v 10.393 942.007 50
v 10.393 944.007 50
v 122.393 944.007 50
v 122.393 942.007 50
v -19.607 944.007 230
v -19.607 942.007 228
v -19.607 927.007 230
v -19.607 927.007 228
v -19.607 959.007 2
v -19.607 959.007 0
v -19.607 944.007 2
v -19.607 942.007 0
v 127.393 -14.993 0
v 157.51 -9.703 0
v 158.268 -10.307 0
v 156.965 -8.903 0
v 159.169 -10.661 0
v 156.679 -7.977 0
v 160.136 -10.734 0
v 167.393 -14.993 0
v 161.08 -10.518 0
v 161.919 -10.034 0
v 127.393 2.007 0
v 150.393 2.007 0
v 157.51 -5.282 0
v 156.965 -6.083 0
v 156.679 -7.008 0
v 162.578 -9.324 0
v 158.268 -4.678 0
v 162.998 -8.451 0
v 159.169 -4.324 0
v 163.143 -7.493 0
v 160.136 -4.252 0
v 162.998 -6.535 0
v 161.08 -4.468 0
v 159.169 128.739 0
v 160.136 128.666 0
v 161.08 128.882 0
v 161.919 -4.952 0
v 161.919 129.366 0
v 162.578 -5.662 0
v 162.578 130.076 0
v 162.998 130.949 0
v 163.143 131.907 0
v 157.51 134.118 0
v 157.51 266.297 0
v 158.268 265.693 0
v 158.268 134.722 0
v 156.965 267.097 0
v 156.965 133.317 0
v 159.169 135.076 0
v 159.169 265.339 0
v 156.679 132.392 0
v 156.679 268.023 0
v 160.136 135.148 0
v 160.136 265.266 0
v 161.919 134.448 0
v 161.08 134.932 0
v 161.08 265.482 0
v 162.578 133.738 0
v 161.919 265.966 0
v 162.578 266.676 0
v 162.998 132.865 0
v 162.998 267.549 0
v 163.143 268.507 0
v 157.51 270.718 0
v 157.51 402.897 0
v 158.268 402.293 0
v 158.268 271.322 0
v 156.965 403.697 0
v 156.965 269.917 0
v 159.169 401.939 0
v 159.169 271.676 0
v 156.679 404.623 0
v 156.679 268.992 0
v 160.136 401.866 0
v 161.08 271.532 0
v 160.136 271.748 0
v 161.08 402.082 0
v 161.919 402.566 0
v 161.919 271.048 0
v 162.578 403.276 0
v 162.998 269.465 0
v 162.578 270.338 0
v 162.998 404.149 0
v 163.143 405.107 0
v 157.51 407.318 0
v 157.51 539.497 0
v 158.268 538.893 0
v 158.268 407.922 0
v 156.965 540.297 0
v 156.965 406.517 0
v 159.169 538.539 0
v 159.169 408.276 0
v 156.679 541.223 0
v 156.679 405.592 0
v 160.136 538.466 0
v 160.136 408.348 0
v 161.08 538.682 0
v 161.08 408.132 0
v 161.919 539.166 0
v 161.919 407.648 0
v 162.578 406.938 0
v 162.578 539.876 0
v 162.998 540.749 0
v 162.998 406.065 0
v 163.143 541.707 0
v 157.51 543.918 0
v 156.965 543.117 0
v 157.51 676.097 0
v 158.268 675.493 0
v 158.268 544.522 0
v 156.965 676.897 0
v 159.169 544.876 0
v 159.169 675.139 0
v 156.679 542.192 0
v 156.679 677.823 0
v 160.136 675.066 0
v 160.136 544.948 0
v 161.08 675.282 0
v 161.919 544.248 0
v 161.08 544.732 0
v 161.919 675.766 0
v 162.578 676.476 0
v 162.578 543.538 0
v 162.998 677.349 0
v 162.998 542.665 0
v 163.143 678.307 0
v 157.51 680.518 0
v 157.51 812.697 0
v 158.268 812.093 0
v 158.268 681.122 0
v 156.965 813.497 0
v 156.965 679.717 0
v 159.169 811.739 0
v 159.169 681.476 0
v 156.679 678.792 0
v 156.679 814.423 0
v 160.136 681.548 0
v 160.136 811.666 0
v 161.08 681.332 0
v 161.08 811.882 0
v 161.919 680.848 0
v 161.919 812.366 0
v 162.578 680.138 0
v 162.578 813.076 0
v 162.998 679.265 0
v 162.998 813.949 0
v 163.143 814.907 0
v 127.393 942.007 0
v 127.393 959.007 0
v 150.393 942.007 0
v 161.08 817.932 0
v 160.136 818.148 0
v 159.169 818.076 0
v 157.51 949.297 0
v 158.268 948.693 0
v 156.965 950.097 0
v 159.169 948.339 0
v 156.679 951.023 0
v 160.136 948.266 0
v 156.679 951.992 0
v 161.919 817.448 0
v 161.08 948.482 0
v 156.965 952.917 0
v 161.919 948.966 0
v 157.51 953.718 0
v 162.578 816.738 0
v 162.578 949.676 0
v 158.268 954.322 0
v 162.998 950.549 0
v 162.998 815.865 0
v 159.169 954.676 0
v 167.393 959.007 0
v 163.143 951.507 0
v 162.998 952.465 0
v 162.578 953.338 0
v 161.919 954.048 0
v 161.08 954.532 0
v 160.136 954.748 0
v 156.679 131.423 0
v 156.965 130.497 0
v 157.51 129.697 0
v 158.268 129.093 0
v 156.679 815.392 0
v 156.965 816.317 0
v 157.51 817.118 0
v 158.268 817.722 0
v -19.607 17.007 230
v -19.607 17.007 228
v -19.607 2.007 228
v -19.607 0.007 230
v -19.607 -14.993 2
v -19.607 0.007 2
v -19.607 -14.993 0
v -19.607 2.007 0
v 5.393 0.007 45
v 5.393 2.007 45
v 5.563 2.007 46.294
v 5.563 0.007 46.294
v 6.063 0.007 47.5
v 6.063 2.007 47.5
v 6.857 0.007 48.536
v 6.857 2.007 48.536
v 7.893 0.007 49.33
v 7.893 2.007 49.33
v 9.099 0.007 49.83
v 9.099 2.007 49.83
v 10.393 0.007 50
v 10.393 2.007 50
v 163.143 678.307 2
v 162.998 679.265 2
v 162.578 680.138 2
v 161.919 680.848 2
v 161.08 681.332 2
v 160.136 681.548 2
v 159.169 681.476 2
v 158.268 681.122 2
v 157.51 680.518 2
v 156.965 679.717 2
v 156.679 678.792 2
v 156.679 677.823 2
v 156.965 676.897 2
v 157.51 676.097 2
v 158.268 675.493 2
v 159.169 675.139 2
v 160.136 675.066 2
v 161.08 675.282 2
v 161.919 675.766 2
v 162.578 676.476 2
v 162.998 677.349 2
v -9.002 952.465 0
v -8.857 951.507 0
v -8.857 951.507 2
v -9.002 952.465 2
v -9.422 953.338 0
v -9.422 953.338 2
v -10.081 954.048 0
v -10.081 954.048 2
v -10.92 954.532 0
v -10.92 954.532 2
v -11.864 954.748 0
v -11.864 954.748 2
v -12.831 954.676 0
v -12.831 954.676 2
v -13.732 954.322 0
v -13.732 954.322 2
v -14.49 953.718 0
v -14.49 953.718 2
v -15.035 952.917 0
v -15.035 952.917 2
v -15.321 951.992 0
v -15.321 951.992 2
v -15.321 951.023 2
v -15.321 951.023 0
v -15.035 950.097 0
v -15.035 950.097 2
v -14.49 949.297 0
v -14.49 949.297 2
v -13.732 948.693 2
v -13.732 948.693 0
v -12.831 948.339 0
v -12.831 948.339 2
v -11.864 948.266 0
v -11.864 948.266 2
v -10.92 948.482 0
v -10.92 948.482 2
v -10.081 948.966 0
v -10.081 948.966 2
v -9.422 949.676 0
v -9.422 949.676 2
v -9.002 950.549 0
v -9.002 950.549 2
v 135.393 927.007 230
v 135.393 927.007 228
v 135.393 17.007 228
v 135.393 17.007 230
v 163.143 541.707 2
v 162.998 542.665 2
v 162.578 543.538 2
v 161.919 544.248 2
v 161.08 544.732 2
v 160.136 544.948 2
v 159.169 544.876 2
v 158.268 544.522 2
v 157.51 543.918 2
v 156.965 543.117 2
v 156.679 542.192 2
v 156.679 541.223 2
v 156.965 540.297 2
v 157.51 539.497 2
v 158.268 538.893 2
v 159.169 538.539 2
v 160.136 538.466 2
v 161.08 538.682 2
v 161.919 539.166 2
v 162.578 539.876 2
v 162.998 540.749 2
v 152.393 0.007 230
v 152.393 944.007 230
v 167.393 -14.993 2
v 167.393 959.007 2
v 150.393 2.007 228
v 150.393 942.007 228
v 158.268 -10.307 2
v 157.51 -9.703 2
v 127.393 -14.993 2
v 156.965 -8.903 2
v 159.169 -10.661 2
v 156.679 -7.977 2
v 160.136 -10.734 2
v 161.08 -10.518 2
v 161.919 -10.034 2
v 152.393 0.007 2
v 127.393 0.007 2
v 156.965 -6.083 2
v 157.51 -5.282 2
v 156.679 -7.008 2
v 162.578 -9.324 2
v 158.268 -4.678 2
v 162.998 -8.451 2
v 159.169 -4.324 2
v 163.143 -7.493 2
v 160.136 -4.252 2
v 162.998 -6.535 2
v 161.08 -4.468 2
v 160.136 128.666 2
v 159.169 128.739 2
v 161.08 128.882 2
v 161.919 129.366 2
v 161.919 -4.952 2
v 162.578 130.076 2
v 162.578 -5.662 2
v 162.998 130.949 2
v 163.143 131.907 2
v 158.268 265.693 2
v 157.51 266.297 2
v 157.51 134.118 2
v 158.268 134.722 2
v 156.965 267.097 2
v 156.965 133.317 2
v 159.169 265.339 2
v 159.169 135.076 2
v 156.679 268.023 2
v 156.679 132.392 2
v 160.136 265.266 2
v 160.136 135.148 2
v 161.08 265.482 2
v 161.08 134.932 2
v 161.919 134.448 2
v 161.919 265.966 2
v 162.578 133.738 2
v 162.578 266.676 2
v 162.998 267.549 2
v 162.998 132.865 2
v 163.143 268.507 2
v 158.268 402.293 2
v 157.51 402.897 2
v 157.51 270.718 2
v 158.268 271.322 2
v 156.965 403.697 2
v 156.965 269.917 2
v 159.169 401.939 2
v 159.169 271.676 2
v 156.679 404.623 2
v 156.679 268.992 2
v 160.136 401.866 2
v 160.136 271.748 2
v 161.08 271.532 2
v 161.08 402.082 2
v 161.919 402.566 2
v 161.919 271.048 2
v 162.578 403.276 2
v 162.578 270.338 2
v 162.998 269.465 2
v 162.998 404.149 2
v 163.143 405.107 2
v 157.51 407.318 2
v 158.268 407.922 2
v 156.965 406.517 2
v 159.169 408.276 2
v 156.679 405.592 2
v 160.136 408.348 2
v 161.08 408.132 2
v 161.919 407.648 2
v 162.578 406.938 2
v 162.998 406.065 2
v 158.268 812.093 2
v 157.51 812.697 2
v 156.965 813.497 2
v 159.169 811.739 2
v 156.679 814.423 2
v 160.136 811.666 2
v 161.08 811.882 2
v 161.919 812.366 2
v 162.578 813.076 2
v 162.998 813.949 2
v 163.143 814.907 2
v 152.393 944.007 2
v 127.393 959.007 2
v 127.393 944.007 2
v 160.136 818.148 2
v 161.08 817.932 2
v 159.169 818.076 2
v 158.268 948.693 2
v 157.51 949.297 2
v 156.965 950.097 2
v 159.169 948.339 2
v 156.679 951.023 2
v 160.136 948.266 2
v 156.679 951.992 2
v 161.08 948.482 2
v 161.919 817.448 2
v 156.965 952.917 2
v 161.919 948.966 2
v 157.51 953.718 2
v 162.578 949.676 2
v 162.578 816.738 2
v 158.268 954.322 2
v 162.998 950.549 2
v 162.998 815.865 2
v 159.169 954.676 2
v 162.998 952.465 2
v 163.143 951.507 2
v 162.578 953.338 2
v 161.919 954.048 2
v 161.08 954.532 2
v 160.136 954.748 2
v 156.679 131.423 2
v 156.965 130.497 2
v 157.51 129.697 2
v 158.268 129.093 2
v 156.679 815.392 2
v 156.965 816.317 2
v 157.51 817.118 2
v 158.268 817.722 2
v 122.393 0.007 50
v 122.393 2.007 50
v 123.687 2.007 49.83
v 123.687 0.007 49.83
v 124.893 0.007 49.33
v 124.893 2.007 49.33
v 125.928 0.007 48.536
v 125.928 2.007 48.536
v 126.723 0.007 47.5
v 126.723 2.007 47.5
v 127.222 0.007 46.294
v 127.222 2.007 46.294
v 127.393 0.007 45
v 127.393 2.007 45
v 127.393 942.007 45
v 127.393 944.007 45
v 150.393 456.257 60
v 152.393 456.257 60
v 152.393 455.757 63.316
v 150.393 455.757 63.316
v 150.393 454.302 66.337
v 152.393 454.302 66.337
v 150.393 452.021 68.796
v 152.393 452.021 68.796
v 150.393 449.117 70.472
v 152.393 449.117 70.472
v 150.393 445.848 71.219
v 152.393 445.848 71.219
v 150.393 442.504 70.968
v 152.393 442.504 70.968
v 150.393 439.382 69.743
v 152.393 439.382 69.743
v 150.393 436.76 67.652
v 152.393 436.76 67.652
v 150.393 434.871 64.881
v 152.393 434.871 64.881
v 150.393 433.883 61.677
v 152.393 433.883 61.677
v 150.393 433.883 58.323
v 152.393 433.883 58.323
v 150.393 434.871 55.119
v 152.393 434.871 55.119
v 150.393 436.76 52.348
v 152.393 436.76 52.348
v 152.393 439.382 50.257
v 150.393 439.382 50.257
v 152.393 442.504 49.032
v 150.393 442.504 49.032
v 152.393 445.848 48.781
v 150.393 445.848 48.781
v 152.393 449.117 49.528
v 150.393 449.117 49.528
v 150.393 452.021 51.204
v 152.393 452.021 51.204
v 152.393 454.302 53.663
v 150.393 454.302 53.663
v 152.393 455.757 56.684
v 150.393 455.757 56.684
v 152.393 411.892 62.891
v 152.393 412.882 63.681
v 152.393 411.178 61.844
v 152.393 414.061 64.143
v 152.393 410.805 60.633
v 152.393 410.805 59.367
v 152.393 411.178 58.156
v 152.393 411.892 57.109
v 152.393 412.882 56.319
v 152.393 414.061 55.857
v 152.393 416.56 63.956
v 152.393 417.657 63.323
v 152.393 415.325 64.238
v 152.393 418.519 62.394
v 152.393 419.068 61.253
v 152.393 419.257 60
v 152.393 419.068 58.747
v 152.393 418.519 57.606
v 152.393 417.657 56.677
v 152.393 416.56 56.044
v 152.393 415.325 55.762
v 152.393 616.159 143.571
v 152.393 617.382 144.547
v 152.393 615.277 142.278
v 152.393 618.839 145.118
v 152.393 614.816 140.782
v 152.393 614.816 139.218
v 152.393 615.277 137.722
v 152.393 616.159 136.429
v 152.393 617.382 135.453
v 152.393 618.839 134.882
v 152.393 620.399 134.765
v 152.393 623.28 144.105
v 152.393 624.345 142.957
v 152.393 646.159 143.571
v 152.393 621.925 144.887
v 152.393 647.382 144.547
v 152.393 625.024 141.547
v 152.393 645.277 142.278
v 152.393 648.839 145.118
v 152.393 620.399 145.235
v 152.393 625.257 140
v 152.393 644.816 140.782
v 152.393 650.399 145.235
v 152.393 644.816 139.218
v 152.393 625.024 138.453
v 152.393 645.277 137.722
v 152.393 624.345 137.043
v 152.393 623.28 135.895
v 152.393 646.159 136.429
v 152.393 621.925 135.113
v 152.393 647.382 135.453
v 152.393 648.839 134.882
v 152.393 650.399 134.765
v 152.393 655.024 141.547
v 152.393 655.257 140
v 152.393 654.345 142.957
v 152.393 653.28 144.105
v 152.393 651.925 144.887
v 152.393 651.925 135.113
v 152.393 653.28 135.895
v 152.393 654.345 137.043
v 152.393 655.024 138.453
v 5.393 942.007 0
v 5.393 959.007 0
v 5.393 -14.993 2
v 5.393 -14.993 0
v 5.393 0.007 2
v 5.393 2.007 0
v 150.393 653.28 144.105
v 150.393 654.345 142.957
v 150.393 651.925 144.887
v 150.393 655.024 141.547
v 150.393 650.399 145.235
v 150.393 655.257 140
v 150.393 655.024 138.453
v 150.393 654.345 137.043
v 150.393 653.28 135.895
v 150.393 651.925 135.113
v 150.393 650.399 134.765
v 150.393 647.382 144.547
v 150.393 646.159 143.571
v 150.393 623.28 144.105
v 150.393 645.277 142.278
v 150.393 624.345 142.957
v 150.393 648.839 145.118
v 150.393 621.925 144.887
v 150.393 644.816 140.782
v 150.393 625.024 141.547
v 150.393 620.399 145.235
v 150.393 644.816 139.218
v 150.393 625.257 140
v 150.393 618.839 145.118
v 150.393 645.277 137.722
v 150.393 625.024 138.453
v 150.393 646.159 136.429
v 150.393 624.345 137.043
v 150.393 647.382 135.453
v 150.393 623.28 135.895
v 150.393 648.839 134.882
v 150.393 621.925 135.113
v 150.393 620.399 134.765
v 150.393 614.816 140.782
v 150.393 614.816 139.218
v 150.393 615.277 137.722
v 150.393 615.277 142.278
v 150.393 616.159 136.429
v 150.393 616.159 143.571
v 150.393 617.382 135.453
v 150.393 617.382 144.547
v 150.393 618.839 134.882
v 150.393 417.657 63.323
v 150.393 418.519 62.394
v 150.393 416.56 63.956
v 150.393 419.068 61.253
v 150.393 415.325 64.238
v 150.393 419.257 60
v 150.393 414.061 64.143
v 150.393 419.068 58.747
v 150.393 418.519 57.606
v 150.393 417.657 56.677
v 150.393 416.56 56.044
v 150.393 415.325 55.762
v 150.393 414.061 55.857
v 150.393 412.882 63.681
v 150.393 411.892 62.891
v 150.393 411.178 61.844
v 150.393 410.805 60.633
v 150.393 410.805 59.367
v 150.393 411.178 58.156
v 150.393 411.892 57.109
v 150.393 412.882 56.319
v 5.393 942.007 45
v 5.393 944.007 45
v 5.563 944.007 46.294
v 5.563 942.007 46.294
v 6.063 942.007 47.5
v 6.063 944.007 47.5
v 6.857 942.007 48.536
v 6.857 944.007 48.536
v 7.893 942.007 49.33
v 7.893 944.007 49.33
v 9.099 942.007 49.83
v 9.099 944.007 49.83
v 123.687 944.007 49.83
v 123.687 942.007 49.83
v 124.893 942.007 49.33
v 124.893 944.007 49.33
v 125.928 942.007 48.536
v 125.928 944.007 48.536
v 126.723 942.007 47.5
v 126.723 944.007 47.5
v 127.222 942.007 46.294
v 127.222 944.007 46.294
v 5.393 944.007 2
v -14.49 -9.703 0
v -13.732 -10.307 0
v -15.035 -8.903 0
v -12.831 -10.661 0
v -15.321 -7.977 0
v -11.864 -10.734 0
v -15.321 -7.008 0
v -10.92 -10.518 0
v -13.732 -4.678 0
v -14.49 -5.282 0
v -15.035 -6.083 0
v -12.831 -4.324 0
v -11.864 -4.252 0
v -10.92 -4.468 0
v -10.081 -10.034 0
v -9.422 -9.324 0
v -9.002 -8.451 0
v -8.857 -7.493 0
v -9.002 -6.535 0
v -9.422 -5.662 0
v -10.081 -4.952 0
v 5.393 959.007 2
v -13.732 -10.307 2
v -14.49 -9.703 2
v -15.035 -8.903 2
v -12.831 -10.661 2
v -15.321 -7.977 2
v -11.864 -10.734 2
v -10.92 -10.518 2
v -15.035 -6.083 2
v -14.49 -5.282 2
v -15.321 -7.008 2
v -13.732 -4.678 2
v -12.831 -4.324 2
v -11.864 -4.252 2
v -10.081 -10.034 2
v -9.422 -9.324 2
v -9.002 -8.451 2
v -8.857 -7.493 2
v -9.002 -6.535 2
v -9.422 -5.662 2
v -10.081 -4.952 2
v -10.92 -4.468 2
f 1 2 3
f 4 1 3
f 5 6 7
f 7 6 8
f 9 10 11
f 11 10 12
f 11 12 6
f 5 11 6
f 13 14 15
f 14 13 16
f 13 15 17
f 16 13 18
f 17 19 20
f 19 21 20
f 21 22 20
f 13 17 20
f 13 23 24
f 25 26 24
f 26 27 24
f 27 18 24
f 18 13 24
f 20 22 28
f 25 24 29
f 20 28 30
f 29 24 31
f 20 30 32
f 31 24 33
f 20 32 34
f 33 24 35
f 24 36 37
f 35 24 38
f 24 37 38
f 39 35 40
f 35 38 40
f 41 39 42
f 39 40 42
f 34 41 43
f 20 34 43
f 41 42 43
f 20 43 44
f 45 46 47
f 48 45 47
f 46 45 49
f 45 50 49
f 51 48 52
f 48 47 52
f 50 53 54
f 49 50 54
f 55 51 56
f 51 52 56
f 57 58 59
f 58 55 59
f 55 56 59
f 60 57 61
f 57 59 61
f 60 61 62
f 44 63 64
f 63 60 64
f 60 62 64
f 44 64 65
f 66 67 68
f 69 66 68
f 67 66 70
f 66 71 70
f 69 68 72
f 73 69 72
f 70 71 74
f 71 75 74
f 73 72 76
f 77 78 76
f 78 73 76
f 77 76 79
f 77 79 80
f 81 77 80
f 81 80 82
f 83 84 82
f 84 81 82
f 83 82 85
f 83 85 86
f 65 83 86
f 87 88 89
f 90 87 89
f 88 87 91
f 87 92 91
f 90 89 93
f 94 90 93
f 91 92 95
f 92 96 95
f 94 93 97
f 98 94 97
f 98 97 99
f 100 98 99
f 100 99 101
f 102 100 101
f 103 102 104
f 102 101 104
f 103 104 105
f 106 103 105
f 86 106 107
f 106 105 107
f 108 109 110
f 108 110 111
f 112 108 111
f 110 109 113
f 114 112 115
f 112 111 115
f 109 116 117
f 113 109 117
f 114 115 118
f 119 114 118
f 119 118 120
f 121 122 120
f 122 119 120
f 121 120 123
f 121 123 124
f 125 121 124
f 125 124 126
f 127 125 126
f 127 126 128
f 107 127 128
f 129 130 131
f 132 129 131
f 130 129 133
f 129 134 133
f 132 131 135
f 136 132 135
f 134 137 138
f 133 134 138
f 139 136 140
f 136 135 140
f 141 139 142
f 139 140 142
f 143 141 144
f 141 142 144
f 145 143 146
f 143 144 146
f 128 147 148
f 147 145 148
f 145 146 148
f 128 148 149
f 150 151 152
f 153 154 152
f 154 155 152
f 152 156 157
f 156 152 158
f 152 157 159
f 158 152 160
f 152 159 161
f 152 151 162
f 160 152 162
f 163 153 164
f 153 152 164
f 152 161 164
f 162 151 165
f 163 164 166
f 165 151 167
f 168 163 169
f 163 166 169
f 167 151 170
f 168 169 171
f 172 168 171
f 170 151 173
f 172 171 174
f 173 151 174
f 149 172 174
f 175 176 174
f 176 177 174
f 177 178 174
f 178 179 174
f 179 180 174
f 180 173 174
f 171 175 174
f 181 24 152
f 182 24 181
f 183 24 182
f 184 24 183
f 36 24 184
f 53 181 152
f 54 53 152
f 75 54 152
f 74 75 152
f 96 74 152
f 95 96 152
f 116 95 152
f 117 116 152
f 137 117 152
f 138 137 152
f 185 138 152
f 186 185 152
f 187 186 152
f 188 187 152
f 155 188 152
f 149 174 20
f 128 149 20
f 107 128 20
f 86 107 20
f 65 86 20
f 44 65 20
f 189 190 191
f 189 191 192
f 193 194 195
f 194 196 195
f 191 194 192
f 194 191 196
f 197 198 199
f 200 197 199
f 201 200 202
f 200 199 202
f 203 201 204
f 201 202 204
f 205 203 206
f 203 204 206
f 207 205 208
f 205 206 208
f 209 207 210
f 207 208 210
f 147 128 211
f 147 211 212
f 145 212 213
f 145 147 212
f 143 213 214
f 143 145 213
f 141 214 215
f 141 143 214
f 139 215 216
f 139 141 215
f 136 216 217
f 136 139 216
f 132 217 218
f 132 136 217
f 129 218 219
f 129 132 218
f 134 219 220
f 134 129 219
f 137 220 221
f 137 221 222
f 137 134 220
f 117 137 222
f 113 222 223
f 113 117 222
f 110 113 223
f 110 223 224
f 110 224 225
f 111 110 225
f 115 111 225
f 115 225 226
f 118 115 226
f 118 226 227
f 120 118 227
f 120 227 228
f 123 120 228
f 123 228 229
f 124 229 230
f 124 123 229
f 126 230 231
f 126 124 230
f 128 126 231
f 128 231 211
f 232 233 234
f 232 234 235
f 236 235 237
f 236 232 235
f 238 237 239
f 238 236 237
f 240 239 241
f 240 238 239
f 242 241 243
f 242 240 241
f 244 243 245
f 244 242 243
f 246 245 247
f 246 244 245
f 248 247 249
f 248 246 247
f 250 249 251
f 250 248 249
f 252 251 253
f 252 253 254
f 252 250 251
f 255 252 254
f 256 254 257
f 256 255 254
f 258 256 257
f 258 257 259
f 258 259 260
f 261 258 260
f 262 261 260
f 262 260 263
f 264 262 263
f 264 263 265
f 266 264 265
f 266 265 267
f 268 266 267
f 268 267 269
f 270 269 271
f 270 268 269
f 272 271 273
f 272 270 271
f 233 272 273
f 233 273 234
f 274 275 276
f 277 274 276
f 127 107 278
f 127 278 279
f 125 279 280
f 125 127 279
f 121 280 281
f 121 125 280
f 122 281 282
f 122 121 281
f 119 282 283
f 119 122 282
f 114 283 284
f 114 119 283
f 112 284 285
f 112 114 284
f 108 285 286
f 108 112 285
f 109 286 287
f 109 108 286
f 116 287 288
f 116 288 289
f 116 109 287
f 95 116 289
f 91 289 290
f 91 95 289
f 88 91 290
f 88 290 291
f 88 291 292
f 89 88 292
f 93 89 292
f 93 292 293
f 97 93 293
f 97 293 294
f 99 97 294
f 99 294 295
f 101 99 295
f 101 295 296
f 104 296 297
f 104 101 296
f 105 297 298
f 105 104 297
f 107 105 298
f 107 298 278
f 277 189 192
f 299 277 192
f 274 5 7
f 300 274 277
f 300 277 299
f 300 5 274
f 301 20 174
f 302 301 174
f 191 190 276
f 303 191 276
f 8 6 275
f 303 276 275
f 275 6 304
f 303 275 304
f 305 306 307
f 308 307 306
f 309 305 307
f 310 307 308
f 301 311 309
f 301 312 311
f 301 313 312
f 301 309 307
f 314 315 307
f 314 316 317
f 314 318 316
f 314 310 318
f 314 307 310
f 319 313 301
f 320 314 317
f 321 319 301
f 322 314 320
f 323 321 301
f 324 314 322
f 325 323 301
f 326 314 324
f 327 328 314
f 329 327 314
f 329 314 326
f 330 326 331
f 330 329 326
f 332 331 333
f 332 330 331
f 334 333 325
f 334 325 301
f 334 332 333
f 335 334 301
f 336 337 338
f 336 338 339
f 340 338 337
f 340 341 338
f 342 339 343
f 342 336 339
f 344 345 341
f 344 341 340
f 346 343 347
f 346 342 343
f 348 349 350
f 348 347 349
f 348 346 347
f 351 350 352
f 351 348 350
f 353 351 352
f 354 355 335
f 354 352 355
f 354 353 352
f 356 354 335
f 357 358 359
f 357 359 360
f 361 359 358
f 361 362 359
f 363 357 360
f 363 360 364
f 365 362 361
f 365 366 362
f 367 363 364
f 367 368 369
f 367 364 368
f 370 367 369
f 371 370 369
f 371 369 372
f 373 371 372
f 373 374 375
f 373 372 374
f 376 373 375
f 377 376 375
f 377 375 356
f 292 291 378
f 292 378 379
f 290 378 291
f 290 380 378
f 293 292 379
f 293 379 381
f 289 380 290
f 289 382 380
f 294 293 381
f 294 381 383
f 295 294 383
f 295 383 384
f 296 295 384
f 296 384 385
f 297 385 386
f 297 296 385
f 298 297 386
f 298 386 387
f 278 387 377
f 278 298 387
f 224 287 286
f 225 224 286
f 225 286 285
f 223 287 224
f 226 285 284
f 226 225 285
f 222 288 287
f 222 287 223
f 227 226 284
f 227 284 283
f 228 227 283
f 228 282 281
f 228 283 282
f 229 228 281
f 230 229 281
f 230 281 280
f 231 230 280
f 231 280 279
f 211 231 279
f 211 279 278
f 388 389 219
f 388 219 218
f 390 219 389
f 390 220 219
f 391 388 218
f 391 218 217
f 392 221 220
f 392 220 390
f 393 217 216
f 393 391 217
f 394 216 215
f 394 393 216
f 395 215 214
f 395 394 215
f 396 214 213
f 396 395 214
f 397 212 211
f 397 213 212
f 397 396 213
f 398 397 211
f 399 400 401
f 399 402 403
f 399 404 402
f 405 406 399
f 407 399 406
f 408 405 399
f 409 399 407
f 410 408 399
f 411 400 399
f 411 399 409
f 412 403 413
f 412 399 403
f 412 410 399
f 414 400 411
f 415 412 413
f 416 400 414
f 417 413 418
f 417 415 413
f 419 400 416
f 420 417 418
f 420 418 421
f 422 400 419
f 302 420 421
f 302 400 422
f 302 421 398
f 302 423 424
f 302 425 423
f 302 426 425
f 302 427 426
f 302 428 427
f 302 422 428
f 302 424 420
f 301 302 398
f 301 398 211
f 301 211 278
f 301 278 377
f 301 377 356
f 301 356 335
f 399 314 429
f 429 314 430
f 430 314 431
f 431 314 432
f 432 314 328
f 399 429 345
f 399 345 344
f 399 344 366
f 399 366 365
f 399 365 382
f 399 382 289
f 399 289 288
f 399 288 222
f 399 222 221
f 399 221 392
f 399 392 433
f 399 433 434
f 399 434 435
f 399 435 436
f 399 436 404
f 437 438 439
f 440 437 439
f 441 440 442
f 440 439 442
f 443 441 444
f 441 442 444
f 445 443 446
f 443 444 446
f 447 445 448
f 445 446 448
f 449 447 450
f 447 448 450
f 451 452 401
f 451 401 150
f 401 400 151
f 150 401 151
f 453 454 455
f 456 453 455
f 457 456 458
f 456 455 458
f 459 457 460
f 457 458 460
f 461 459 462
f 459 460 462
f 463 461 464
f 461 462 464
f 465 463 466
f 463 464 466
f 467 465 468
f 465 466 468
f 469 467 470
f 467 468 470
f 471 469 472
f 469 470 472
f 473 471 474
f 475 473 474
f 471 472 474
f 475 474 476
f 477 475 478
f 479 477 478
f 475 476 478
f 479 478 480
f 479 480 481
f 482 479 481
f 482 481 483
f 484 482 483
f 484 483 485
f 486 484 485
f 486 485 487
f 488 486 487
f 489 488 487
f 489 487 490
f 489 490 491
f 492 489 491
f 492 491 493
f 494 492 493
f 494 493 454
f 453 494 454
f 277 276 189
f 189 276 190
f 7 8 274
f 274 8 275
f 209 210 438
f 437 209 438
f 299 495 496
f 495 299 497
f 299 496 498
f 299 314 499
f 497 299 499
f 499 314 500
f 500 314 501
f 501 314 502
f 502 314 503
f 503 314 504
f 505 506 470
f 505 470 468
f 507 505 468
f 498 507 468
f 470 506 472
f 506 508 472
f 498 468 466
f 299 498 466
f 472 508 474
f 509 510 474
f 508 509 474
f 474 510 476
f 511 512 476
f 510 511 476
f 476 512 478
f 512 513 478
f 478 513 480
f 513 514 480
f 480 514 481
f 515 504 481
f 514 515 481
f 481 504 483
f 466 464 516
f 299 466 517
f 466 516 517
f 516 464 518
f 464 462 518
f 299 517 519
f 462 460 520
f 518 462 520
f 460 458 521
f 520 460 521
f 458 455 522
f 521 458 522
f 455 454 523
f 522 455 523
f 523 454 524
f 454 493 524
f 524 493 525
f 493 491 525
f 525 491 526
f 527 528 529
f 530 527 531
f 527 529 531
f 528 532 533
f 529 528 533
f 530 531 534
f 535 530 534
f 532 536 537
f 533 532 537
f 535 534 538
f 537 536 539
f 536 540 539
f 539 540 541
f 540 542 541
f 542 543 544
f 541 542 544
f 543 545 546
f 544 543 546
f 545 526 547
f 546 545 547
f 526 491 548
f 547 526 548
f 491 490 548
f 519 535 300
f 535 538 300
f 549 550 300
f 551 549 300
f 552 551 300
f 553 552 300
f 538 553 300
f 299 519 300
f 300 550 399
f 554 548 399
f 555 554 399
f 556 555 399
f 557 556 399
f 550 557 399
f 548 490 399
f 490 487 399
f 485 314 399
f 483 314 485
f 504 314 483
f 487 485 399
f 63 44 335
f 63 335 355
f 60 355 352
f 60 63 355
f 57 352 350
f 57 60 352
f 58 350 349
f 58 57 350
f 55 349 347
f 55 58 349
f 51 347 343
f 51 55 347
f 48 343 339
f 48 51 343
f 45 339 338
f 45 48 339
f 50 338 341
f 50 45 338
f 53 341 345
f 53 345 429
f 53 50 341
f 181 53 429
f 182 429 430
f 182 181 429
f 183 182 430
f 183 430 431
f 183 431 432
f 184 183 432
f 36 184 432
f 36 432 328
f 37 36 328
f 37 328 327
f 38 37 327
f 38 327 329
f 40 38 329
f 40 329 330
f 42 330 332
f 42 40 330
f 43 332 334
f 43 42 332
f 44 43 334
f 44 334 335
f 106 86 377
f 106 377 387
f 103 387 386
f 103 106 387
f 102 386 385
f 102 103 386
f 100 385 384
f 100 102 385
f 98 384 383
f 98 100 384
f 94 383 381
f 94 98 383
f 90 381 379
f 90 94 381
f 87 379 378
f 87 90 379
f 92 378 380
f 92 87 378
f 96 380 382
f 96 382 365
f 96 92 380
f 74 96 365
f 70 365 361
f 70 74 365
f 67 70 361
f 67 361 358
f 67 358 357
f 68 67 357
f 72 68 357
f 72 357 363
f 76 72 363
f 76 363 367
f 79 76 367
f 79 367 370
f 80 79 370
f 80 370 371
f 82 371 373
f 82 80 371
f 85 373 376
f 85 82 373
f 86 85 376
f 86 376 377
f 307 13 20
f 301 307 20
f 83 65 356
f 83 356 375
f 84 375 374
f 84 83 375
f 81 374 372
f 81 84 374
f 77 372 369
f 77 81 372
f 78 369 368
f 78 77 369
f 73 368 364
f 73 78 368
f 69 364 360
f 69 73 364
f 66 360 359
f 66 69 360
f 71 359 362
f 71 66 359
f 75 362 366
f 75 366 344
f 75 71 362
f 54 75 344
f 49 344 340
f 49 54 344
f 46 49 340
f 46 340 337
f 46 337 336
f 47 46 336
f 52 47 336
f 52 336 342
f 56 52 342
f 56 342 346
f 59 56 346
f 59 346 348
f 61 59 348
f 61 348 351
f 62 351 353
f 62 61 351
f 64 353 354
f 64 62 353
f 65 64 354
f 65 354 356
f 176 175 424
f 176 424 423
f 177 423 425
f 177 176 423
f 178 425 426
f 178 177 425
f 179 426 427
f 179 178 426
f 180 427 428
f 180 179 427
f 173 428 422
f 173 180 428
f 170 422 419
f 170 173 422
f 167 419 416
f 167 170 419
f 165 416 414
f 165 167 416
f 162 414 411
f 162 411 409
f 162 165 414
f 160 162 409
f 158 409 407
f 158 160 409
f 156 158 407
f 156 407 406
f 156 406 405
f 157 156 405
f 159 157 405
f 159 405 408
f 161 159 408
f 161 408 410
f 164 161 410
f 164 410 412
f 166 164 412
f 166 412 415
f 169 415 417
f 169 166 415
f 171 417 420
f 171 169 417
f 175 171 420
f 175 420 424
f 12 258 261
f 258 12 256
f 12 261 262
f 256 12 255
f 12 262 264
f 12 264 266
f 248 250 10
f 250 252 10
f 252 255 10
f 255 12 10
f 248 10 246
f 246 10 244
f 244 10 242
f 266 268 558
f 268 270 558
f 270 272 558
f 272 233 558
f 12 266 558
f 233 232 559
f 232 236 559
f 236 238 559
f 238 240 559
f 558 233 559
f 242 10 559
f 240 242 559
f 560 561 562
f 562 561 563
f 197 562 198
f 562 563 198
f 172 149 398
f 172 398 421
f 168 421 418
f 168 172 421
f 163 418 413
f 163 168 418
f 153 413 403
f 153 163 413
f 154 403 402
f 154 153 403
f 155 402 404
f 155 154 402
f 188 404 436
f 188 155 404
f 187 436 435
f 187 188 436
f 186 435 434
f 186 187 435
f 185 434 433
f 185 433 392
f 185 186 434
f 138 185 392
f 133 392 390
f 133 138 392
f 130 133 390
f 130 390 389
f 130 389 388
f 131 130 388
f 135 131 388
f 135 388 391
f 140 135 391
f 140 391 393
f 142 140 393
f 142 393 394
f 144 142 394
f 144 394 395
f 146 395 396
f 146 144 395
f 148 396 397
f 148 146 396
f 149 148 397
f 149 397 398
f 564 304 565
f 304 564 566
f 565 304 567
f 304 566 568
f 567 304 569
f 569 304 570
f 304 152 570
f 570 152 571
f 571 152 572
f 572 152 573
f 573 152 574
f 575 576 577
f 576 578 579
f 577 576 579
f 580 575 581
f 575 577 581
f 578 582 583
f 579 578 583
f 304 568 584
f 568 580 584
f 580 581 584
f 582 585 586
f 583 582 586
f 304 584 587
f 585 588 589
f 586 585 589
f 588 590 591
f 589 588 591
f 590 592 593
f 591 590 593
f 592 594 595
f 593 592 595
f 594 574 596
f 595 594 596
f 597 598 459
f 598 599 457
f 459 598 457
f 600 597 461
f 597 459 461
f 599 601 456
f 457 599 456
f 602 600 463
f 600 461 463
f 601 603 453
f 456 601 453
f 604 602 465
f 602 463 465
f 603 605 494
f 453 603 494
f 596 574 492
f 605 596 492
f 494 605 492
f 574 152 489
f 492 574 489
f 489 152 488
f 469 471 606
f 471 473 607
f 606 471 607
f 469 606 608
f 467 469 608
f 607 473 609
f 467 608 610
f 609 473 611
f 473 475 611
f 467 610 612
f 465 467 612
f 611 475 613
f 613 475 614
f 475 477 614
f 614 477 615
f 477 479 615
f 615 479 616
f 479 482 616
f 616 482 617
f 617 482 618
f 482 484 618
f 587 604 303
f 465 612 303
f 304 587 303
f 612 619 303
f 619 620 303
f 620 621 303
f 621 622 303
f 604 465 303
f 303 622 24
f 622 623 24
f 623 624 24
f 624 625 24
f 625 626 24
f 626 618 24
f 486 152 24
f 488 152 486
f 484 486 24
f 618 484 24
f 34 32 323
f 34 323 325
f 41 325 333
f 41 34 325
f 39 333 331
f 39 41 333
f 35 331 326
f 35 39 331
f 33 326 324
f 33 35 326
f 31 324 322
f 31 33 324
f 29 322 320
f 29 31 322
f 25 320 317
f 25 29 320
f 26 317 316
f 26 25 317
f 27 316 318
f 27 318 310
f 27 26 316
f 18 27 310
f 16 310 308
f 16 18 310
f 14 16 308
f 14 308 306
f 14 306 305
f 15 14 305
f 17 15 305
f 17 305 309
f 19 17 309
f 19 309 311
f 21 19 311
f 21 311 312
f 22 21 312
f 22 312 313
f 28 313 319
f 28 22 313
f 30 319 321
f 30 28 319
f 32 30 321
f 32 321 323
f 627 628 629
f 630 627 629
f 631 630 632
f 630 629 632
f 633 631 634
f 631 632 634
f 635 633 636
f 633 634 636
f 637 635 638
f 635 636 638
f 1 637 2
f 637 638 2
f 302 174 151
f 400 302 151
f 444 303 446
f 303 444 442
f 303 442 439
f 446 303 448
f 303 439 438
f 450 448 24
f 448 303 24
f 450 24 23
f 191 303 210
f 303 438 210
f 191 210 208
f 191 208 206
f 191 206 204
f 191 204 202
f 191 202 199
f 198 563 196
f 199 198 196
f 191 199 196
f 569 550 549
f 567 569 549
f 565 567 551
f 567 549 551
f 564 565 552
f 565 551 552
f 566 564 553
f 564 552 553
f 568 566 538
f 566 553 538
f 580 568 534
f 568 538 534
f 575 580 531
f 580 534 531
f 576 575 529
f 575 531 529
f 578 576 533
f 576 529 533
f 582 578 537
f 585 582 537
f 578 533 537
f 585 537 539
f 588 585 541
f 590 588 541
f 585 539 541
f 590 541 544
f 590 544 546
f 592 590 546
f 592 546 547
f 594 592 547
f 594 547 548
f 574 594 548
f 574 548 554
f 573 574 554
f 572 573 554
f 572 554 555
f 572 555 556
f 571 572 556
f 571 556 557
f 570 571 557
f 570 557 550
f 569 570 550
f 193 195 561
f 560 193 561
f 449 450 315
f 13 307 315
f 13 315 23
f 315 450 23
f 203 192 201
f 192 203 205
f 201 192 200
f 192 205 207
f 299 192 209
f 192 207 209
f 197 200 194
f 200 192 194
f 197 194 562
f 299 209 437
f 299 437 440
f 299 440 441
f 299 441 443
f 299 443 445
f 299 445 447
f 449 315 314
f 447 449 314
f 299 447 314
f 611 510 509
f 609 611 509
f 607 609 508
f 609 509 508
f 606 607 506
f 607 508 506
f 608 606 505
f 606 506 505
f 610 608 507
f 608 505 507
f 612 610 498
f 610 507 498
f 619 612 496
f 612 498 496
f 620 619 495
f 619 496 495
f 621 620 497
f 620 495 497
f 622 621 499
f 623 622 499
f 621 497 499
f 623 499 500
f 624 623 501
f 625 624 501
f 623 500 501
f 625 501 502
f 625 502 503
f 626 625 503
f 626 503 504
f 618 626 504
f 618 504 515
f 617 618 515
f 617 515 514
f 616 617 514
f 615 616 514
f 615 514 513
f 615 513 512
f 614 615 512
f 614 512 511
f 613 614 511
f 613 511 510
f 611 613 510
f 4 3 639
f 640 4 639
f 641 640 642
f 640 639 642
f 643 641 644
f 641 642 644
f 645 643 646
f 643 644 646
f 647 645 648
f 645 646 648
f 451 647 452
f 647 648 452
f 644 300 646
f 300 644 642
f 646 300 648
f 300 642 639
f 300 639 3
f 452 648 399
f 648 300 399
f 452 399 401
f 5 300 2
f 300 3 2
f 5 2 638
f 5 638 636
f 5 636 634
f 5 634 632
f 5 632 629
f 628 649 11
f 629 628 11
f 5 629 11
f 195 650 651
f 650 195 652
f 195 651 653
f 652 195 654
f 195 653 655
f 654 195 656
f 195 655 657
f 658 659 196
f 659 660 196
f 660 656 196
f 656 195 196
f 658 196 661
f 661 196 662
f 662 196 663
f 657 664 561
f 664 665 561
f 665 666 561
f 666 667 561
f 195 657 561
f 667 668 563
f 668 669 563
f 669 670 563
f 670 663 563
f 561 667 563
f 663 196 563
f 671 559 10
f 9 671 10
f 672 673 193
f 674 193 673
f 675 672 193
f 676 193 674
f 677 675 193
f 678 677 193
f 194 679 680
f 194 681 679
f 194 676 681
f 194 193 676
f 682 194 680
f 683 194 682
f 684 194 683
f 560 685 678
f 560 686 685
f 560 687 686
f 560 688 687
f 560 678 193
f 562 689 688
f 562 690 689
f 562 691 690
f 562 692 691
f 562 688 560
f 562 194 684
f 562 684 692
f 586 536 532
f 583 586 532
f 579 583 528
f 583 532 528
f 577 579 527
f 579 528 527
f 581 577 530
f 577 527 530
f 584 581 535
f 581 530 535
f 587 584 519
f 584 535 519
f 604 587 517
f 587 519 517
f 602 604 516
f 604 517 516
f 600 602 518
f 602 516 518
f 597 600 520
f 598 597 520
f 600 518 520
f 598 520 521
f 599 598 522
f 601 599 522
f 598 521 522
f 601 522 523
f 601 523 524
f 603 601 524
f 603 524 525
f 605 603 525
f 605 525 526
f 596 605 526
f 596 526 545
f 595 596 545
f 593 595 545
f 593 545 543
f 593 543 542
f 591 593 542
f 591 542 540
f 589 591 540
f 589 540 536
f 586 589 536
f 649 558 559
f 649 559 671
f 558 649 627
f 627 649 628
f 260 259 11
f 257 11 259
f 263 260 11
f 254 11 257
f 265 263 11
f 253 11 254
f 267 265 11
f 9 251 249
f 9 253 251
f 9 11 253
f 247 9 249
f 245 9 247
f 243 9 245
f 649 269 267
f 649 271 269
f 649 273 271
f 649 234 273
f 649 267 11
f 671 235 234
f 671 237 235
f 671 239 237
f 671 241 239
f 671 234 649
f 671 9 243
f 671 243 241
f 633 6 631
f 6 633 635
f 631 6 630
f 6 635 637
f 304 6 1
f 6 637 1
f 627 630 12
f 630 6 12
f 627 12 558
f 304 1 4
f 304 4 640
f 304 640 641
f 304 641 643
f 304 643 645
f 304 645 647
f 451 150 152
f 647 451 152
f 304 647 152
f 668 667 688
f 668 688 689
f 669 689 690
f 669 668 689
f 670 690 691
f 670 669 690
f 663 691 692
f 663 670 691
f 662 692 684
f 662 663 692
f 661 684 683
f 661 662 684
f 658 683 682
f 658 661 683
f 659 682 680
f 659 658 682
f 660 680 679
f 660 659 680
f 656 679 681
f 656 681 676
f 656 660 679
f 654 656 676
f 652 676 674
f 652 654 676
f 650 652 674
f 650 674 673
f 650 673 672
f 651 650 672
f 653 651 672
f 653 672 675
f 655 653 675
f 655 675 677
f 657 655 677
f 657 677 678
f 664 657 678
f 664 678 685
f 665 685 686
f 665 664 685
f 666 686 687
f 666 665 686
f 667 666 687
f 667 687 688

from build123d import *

# Parameters (mm, degrees)
F0_R     = 3.25
F1_DEPTH = 2
F3_DEPTH = 226
F5_DEPTH = 2
F7_DEPTH = 1220.99755
F8_R     = 5.25
F8_R_2   = 11.25
F8_R_3   = 4.25
F9_DEPTH = 25


with BuildPart() as f1:
    # F0 (on Top) → F1 (new body)
    with BuildSketch(Plane.XY):
        Polygon((-19.607349, 959.007126), (-19.607349, 942.007126), (150.392651, 942.007126), (150.392651, 2.007126), (-19.607349, 2.007126), (-19.607349, -14.992874), (167.392651, -14.992874), (167.392651, 959.007126), align=None)
        with Locations((-12.107349, -7.492874)):
            Circle(F0_R, mode=Mode.SUBTRACT)
        with Locations((159.892651, -7.492874)):
            Circle(F0_R, mode=Mode.SUBTRACT)
        with Locations((159.892651, 131.907126)):
            Circle(F0_R, mode=Mode.SUBTRACT)
        with Locations((159.892651, 268.507126)):
            Circle(F0_R, mode=Mode.SUBTRACT)
        with Locations((159.892651, 405.107126)):
            Circle(F0_R, mode=Mode.SUBTRACT)
        with Locations((-12.107349, 951.507126)):
            Circle(F0_R, mode=Mode.SUBTRACT)
        with Locations((159.892651, 541.707126)):
            Circle(F0_R, mode=Mode.SUBTRACT)
        with Locations((159.892651, 678.307126)):
            Circle(F0_R, mode=Mode.SUBTRACT)
        with Locations((159.892651, 814.907126)):
            Circle(F0_R, mode=Mode.SUBTRACT)
        with Locations((159.892651, 951.507126)):
            Circle(F0_R, mode=Mode.SUBTRACT)
    extrude(amount=F1_DEPTH)

    # F2 (on face) → F3 (join)
    with BuildSketch(Plane.XY.offset(2)):
        Polygon((-19.607349, 944.007126), (-19.607349, 942.007126), (150.392651, 942.007126), (150.392651, 2.007126), (-19.607349, 2.007126), (-19.607349, 0.007126), (152.392651, 0.007126), (152.392651, 944.007126), align=None)
    extrude(amount=F3_DEPTH)

    # F4 (on face) → F5 (join)
    with BuildSketch(Plane.XY.offset(228)):
        Polygon((152.392651, 944.007126), (-19.607349, 944.007126), (-19.607349, 927.007126), (135.392651, 927.007126), (135.392651, 17.007126), (-19.607349, 17.007126), (-19.607349, 0.007126), (152.392651, 0.007126), align=None)
    extrude(amount=F5_DEPTH)

    # F6 (on face) → F7 (cut)
    with BuildSketch(Plane(origin=(0, 959.007126, 0), x_dir=(-1, 0, 0), z_dir=(0, 1, 0))):
        with BuildLine():
            Line((-10.392651, 50), (-122.392651, 50))
            ThreePointArc((-122.392651, 50), (-125.928185, 48.535534), (-127.392651, 45))
            Line((-127.392651, 45), (-127.392651, -20.446198))
            Line((-127.392651, -20.446198), (-5.392651, -20.446198))
            Line((-5.392651, -20.446198), (-5.392651, 45))
            ThreePointArc((-5.392651, 45), (-6.857117, 48.535534), (-10.392651, 50))
        make_face()
    extrude(amount=-F7_DEPTH, mode=Mode.SUBTRACT)

    # F8 (on face) → F9 (cut)
    with BuildSketch(Plane.YZ.offset(152.392651)):
        with Locations((620.007126, 140)):
            Circle(F8_R)
        with Locations((650.007126, 140)):
            Circle(F8_R)
        with Locations((445.007126, 60)):
            Circle(F8_R_2)
        with Locations((415.007126, 60)):
            Circle(F8_R_3)
    extrude(amount=-F9_DEPTH, mode=Mode.SUBTRACT)


solid = f1.part
